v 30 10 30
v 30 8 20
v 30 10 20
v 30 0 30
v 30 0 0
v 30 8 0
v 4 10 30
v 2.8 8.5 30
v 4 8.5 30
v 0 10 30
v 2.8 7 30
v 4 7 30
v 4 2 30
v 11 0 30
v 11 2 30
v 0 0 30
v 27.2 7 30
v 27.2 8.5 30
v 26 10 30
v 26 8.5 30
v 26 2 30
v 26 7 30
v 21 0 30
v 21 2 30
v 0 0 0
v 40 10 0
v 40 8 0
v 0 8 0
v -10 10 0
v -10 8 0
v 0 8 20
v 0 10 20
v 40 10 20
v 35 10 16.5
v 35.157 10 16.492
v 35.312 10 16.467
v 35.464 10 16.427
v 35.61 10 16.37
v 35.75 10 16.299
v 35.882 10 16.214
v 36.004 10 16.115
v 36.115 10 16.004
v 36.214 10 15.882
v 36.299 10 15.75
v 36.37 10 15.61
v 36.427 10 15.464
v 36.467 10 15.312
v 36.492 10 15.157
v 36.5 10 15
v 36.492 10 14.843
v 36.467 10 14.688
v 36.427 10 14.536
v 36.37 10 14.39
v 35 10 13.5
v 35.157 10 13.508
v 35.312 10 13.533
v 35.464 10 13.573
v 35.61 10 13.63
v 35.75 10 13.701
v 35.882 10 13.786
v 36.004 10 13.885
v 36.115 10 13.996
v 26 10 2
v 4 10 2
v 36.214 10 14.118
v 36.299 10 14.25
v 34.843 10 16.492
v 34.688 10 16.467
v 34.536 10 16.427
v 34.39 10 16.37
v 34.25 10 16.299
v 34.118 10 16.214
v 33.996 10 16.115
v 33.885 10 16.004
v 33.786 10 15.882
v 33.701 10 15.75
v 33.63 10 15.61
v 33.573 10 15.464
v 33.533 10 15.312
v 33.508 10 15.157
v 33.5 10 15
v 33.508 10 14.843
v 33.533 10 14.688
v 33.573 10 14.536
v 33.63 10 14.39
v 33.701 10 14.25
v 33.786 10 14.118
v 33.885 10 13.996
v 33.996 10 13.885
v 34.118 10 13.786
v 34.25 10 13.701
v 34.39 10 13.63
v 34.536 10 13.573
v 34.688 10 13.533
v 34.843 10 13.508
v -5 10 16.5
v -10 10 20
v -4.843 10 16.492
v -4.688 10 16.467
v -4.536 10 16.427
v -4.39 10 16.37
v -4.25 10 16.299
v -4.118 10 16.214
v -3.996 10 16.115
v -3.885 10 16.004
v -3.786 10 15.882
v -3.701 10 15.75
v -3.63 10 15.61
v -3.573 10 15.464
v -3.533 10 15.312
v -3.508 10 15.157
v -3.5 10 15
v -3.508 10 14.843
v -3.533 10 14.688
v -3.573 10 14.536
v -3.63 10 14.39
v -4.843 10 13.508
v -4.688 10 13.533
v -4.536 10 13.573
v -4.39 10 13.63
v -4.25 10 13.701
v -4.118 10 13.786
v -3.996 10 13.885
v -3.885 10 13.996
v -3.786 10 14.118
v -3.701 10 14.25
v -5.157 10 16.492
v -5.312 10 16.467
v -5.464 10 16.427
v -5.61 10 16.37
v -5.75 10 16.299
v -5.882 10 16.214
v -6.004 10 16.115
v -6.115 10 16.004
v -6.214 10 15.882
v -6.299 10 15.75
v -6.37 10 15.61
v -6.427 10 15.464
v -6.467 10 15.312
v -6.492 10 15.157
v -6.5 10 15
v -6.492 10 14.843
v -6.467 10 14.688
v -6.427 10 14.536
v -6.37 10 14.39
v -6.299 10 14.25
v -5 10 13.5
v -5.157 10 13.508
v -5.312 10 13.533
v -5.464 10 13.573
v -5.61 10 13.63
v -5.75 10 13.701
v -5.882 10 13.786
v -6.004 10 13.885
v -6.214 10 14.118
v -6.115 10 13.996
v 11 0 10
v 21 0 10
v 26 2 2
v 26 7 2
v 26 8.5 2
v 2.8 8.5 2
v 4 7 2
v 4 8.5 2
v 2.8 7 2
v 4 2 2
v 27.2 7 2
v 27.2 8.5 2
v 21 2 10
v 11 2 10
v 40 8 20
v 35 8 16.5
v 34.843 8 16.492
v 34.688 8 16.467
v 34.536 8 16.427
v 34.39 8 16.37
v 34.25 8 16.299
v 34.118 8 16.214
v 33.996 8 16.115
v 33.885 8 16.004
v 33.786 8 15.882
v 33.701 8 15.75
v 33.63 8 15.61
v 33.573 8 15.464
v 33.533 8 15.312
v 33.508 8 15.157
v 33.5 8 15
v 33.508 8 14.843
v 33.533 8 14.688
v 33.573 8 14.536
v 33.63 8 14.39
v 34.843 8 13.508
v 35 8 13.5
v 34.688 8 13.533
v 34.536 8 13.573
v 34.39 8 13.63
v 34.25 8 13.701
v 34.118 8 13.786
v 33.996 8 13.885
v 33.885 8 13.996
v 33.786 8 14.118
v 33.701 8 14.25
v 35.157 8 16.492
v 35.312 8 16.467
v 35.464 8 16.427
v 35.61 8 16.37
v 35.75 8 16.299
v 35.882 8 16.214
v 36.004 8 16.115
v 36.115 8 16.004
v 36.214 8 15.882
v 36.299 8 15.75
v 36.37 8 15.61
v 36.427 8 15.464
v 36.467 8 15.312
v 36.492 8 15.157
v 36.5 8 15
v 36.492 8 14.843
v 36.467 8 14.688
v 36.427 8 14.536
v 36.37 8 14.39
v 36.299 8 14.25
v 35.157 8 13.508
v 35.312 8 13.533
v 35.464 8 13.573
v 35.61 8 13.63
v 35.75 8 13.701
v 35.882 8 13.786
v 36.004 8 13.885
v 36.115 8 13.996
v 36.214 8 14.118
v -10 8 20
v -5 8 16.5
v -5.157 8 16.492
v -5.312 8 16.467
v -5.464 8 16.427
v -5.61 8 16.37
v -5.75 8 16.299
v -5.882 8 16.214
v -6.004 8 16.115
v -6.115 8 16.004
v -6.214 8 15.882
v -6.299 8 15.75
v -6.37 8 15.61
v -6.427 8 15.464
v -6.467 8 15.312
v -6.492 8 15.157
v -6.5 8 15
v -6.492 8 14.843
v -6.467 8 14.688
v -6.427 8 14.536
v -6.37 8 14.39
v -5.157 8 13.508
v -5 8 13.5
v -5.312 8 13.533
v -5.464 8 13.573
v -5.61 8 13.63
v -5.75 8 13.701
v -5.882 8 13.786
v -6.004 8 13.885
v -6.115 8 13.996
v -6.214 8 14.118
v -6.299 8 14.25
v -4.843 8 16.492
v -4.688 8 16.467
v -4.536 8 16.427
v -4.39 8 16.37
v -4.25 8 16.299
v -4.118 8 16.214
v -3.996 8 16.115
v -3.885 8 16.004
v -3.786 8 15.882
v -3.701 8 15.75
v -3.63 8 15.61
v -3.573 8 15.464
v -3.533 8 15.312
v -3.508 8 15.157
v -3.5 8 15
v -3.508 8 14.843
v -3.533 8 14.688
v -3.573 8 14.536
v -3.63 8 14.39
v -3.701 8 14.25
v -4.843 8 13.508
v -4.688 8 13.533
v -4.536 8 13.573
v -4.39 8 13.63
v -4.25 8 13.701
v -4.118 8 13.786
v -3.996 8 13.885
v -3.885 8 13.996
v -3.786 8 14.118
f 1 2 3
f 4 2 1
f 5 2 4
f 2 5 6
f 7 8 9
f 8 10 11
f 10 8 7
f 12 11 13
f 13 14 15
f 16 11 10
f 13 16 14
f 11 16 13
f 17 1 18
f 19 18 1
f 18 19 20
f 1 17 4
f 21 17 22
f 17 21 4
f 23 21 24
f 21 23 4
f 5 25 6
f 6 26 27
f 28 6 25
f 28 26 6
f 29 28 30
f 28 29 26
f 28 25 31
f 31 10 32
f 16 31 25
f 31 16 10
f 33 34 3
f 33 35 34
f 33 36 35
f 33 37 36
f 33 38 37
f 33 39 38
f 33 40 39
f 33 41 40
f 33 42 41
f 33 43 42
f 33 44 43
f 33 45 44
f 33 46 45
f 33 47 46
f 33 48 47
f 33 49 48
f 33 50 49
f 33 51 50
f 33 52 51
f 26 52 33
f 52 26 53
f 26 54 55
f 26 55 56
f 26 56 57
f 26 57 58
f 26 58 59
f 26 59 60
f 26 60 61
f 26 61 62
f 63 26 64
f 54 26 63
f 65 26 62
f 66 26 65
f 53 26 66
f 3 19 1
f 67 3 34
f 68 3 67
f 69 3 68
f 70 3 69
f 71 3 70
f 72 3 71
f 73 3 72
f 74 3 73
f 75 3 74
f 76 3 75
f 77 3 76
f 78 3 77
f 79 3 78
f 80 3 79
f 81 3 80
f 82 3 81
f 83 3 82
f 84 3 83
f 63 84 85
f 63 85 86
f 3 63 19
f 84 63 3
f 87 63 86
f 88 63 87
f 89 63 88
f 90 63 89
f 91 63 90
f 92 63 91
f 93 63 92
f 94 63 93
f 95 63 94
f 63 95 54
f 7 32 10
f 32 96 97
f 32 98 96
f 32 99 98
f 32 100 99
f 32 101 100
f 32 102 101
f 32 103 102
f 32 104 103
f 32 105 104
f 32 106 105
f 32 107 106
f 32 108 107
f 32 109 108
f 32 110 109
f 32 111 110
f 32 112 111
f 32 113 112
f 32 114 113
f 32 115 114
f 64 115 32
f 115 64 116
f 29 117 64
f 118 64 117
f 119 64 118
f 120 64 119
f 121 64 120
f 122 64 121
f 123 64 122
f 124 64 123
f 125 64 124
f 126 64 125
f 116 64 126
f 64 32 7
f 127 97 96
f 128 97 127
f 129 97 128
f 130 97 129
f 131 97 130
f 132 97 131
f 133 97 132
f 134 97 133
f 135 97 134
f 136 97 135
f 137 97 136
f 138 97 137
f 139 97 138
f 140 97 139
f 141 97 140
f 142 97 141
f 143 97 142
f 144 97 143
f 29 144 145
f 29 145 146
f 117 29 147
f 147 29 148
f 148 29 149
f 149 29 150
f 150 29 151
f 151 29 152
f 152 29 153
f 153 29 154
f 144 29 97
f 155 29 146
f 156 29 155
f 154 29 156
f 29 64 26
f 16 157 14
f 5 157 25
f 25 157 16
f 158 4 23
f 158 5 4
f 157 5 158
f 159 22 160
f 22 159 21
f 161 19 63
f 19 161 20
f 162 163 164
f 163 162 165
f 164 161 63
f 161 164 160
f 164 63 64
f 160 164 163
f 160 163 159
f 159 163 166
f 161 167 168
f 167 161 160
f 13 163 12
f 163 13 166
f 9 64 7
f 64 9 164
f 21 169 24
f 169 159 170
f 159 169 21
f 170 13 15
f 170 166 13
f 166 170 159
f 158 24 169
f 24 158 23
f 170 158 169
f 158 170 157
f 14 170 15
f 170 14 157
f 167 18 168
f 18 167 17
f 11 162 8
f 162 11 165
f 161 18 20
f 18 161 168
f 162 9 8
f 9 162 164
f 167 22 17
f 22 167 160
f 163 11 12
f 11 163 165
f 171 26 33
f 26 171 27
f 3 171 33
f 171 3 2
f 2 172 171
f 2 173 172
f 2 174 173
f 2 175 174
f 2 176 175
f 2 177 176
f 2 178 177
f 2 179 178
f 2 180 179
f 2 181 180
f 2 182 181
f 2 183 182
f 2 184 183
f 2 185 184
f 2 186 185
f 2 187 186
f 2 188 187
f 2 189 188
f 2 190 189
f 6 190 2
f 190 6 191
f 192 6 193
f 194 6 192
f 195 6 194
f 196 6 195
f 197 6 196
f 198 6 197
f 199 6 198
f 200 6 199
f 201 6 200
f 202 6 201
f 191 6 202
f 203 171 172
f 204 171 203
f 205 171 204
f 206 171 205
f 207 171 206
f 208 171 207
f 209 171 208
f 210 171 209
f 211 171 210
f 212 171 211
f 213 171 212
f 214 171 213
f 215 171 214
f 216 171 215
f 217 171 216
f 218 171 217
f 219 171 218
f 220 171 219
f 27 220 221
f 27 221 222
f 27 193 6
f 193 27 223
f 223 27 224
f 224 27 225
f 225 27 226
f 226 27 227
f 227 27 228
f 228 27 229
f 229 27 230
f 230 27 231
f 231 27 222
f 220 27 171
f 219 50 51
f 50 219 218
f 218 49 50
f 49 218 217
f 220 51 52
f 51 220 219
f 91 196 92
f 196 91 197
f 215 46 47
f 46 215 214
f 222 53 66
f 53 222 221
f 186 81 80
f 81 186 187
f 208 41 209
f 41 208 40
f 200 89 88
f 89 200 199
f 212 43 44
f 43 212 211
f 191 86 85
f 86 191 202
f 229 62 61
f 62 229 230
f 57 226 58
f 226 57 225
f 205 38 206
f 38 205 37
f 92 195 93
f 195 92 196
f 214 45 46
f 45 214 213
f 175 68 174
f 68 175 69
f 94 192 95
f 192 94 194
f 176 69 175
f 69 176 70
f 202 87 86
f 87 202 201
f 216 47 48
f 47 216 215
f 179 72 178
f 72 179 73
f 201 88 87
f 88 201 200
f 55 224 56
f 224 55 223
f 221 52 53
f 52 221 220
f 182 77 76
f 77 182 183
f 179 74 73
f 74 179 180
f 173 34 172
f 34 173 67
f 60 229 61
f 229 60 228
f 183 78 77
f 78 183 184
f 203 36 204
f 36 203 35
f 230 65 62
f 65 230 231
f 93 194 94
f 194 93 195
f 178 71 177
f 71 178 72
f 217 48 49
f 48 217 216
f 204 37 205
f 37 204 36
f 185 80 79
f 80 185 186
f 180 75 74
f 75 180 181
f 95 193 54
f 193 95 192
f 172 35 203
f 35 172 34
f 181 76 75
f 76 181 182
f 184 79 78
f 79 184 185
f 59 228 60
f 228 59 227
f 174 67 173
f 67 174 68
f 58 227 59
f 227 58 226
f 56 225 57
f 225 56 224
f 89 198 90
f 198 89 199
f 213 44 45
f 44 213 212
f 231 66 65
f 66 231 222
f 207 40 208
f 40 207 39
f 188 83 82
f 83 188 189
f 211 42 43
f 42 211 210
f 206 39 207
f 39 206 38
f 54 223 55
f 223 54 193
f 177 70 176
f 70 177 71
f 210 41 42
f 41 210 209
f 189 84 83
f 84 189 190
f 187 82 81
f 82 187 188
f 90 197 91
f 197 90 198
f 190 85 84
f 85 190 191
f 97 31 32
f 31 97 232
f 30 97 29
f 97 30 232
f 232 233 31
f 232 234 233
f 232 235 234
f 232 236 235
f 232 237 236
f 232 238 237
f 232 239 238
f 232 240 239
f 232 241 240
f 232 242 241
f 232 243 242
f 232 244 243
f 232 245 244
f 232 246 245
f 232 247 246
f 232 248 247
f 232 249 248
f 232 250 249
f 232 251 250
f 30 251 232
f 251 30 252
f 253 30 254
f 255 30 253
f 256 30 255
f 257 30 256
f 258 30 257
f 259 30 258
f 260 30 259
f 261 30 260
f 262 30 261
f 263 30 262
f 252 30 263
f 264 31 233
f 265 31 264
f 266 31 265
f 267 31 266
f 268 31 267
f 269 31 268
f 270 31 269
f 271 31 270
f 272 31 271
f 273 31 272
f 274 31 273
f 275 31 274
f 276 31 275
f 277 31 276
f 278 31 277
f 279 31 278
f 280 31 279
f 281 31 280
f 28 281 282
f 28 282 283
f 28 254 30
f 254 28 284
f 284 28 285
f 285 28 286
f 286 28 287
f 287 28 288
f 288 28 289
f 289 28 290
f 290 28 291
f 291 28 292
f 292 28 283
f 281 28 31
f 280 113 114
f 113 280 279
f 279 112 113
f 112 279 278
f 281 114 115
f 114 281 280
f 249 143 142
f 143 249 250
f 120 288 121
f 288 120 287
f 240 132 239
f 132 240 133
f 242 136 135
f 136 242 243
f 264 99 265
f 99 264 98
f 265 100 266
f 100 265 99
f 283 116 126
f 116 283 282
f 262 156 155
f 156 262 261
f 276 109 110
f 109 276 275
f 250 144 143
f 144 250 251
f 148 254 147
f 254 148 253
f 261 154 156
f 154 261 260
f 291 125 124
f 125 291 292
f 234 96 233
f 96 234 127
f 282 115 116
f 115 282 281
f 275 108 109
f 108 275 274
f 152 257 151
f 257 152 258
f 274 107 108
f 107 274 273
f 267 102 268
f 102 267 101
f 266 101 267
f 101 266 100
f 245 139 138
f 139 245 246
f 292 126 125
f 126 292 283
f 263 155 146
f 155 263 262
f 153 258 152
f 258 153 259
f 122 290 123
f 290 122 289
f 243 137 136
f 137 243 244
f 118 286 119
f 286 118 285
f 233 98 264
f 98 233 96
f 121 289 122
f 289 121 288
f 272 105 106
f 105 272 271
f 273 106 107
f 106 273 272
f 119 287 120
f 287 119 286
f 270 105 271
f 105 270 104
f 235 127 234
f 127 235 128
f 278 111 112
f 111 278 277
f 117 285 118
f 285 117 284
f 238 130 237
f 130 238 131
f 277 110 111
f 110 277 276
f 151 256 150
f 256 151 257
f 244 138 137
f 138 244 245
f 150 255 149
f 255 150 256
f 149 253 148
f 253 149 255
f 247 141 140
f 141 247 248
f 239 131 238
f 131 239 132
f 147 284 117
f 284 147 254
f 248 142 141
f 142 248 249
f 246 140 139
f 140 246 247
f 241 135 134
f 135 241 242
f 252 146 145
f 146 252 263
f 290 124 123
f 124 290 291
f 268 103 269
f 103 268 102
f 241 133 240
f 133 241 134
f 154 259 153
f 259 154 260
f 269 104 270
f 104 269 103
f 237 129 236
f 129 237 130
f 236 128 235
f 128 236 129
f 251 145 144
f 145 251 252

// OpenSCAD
$fn=60;
w=30;
d=10;
h=30;
difference () {
    
    cube([w,d,h]);
   
    translate([w/2-22/2,2,2])
        cube([22,20,40]);
    
    translate([w/2-8/2,0,10])
        cube([10,5,25]);
        //#cylinder(d=4,h=10);
    translate([w/2-24.4/2,5+2,2])
        cube([24.4,1.5,h]);
     translate([-10,0,15])
        rotate([-90,0,0])
        cylinder(d=3,h=2);
     translate([40,0,15])   
       rotate([-90,0,0])
       cylinder(d=3,h=2);
     
 }
 difference() {
 translate([w,8,0])
    cube([10,2,20]);
 translate([w+5,8,15])
     rotate([-90,0,0])
     #cylinder(d=3,h=2);
 }
 difference() {
 translate([-10,8,0])
     cube([10,2,20]);
 translate([-5,8,15])
     rotate([-90,0,0])
     #cylinder(d=3,h=2);
 }
//difference(){
//    translate([-20,0,0])
//        cube([20,2,30]);
//    translate([-10,0,20])
//        rotate([-90,0,0])
//        cylinder(d=3,h=2);
//}
//difference(){
//        translate([30,0,0])
//            cube([20,2,30]);
//        translate([40,0,20])
//            rotate([-90,0,0])
//            #cylinder(d=3,h=2);
//}
